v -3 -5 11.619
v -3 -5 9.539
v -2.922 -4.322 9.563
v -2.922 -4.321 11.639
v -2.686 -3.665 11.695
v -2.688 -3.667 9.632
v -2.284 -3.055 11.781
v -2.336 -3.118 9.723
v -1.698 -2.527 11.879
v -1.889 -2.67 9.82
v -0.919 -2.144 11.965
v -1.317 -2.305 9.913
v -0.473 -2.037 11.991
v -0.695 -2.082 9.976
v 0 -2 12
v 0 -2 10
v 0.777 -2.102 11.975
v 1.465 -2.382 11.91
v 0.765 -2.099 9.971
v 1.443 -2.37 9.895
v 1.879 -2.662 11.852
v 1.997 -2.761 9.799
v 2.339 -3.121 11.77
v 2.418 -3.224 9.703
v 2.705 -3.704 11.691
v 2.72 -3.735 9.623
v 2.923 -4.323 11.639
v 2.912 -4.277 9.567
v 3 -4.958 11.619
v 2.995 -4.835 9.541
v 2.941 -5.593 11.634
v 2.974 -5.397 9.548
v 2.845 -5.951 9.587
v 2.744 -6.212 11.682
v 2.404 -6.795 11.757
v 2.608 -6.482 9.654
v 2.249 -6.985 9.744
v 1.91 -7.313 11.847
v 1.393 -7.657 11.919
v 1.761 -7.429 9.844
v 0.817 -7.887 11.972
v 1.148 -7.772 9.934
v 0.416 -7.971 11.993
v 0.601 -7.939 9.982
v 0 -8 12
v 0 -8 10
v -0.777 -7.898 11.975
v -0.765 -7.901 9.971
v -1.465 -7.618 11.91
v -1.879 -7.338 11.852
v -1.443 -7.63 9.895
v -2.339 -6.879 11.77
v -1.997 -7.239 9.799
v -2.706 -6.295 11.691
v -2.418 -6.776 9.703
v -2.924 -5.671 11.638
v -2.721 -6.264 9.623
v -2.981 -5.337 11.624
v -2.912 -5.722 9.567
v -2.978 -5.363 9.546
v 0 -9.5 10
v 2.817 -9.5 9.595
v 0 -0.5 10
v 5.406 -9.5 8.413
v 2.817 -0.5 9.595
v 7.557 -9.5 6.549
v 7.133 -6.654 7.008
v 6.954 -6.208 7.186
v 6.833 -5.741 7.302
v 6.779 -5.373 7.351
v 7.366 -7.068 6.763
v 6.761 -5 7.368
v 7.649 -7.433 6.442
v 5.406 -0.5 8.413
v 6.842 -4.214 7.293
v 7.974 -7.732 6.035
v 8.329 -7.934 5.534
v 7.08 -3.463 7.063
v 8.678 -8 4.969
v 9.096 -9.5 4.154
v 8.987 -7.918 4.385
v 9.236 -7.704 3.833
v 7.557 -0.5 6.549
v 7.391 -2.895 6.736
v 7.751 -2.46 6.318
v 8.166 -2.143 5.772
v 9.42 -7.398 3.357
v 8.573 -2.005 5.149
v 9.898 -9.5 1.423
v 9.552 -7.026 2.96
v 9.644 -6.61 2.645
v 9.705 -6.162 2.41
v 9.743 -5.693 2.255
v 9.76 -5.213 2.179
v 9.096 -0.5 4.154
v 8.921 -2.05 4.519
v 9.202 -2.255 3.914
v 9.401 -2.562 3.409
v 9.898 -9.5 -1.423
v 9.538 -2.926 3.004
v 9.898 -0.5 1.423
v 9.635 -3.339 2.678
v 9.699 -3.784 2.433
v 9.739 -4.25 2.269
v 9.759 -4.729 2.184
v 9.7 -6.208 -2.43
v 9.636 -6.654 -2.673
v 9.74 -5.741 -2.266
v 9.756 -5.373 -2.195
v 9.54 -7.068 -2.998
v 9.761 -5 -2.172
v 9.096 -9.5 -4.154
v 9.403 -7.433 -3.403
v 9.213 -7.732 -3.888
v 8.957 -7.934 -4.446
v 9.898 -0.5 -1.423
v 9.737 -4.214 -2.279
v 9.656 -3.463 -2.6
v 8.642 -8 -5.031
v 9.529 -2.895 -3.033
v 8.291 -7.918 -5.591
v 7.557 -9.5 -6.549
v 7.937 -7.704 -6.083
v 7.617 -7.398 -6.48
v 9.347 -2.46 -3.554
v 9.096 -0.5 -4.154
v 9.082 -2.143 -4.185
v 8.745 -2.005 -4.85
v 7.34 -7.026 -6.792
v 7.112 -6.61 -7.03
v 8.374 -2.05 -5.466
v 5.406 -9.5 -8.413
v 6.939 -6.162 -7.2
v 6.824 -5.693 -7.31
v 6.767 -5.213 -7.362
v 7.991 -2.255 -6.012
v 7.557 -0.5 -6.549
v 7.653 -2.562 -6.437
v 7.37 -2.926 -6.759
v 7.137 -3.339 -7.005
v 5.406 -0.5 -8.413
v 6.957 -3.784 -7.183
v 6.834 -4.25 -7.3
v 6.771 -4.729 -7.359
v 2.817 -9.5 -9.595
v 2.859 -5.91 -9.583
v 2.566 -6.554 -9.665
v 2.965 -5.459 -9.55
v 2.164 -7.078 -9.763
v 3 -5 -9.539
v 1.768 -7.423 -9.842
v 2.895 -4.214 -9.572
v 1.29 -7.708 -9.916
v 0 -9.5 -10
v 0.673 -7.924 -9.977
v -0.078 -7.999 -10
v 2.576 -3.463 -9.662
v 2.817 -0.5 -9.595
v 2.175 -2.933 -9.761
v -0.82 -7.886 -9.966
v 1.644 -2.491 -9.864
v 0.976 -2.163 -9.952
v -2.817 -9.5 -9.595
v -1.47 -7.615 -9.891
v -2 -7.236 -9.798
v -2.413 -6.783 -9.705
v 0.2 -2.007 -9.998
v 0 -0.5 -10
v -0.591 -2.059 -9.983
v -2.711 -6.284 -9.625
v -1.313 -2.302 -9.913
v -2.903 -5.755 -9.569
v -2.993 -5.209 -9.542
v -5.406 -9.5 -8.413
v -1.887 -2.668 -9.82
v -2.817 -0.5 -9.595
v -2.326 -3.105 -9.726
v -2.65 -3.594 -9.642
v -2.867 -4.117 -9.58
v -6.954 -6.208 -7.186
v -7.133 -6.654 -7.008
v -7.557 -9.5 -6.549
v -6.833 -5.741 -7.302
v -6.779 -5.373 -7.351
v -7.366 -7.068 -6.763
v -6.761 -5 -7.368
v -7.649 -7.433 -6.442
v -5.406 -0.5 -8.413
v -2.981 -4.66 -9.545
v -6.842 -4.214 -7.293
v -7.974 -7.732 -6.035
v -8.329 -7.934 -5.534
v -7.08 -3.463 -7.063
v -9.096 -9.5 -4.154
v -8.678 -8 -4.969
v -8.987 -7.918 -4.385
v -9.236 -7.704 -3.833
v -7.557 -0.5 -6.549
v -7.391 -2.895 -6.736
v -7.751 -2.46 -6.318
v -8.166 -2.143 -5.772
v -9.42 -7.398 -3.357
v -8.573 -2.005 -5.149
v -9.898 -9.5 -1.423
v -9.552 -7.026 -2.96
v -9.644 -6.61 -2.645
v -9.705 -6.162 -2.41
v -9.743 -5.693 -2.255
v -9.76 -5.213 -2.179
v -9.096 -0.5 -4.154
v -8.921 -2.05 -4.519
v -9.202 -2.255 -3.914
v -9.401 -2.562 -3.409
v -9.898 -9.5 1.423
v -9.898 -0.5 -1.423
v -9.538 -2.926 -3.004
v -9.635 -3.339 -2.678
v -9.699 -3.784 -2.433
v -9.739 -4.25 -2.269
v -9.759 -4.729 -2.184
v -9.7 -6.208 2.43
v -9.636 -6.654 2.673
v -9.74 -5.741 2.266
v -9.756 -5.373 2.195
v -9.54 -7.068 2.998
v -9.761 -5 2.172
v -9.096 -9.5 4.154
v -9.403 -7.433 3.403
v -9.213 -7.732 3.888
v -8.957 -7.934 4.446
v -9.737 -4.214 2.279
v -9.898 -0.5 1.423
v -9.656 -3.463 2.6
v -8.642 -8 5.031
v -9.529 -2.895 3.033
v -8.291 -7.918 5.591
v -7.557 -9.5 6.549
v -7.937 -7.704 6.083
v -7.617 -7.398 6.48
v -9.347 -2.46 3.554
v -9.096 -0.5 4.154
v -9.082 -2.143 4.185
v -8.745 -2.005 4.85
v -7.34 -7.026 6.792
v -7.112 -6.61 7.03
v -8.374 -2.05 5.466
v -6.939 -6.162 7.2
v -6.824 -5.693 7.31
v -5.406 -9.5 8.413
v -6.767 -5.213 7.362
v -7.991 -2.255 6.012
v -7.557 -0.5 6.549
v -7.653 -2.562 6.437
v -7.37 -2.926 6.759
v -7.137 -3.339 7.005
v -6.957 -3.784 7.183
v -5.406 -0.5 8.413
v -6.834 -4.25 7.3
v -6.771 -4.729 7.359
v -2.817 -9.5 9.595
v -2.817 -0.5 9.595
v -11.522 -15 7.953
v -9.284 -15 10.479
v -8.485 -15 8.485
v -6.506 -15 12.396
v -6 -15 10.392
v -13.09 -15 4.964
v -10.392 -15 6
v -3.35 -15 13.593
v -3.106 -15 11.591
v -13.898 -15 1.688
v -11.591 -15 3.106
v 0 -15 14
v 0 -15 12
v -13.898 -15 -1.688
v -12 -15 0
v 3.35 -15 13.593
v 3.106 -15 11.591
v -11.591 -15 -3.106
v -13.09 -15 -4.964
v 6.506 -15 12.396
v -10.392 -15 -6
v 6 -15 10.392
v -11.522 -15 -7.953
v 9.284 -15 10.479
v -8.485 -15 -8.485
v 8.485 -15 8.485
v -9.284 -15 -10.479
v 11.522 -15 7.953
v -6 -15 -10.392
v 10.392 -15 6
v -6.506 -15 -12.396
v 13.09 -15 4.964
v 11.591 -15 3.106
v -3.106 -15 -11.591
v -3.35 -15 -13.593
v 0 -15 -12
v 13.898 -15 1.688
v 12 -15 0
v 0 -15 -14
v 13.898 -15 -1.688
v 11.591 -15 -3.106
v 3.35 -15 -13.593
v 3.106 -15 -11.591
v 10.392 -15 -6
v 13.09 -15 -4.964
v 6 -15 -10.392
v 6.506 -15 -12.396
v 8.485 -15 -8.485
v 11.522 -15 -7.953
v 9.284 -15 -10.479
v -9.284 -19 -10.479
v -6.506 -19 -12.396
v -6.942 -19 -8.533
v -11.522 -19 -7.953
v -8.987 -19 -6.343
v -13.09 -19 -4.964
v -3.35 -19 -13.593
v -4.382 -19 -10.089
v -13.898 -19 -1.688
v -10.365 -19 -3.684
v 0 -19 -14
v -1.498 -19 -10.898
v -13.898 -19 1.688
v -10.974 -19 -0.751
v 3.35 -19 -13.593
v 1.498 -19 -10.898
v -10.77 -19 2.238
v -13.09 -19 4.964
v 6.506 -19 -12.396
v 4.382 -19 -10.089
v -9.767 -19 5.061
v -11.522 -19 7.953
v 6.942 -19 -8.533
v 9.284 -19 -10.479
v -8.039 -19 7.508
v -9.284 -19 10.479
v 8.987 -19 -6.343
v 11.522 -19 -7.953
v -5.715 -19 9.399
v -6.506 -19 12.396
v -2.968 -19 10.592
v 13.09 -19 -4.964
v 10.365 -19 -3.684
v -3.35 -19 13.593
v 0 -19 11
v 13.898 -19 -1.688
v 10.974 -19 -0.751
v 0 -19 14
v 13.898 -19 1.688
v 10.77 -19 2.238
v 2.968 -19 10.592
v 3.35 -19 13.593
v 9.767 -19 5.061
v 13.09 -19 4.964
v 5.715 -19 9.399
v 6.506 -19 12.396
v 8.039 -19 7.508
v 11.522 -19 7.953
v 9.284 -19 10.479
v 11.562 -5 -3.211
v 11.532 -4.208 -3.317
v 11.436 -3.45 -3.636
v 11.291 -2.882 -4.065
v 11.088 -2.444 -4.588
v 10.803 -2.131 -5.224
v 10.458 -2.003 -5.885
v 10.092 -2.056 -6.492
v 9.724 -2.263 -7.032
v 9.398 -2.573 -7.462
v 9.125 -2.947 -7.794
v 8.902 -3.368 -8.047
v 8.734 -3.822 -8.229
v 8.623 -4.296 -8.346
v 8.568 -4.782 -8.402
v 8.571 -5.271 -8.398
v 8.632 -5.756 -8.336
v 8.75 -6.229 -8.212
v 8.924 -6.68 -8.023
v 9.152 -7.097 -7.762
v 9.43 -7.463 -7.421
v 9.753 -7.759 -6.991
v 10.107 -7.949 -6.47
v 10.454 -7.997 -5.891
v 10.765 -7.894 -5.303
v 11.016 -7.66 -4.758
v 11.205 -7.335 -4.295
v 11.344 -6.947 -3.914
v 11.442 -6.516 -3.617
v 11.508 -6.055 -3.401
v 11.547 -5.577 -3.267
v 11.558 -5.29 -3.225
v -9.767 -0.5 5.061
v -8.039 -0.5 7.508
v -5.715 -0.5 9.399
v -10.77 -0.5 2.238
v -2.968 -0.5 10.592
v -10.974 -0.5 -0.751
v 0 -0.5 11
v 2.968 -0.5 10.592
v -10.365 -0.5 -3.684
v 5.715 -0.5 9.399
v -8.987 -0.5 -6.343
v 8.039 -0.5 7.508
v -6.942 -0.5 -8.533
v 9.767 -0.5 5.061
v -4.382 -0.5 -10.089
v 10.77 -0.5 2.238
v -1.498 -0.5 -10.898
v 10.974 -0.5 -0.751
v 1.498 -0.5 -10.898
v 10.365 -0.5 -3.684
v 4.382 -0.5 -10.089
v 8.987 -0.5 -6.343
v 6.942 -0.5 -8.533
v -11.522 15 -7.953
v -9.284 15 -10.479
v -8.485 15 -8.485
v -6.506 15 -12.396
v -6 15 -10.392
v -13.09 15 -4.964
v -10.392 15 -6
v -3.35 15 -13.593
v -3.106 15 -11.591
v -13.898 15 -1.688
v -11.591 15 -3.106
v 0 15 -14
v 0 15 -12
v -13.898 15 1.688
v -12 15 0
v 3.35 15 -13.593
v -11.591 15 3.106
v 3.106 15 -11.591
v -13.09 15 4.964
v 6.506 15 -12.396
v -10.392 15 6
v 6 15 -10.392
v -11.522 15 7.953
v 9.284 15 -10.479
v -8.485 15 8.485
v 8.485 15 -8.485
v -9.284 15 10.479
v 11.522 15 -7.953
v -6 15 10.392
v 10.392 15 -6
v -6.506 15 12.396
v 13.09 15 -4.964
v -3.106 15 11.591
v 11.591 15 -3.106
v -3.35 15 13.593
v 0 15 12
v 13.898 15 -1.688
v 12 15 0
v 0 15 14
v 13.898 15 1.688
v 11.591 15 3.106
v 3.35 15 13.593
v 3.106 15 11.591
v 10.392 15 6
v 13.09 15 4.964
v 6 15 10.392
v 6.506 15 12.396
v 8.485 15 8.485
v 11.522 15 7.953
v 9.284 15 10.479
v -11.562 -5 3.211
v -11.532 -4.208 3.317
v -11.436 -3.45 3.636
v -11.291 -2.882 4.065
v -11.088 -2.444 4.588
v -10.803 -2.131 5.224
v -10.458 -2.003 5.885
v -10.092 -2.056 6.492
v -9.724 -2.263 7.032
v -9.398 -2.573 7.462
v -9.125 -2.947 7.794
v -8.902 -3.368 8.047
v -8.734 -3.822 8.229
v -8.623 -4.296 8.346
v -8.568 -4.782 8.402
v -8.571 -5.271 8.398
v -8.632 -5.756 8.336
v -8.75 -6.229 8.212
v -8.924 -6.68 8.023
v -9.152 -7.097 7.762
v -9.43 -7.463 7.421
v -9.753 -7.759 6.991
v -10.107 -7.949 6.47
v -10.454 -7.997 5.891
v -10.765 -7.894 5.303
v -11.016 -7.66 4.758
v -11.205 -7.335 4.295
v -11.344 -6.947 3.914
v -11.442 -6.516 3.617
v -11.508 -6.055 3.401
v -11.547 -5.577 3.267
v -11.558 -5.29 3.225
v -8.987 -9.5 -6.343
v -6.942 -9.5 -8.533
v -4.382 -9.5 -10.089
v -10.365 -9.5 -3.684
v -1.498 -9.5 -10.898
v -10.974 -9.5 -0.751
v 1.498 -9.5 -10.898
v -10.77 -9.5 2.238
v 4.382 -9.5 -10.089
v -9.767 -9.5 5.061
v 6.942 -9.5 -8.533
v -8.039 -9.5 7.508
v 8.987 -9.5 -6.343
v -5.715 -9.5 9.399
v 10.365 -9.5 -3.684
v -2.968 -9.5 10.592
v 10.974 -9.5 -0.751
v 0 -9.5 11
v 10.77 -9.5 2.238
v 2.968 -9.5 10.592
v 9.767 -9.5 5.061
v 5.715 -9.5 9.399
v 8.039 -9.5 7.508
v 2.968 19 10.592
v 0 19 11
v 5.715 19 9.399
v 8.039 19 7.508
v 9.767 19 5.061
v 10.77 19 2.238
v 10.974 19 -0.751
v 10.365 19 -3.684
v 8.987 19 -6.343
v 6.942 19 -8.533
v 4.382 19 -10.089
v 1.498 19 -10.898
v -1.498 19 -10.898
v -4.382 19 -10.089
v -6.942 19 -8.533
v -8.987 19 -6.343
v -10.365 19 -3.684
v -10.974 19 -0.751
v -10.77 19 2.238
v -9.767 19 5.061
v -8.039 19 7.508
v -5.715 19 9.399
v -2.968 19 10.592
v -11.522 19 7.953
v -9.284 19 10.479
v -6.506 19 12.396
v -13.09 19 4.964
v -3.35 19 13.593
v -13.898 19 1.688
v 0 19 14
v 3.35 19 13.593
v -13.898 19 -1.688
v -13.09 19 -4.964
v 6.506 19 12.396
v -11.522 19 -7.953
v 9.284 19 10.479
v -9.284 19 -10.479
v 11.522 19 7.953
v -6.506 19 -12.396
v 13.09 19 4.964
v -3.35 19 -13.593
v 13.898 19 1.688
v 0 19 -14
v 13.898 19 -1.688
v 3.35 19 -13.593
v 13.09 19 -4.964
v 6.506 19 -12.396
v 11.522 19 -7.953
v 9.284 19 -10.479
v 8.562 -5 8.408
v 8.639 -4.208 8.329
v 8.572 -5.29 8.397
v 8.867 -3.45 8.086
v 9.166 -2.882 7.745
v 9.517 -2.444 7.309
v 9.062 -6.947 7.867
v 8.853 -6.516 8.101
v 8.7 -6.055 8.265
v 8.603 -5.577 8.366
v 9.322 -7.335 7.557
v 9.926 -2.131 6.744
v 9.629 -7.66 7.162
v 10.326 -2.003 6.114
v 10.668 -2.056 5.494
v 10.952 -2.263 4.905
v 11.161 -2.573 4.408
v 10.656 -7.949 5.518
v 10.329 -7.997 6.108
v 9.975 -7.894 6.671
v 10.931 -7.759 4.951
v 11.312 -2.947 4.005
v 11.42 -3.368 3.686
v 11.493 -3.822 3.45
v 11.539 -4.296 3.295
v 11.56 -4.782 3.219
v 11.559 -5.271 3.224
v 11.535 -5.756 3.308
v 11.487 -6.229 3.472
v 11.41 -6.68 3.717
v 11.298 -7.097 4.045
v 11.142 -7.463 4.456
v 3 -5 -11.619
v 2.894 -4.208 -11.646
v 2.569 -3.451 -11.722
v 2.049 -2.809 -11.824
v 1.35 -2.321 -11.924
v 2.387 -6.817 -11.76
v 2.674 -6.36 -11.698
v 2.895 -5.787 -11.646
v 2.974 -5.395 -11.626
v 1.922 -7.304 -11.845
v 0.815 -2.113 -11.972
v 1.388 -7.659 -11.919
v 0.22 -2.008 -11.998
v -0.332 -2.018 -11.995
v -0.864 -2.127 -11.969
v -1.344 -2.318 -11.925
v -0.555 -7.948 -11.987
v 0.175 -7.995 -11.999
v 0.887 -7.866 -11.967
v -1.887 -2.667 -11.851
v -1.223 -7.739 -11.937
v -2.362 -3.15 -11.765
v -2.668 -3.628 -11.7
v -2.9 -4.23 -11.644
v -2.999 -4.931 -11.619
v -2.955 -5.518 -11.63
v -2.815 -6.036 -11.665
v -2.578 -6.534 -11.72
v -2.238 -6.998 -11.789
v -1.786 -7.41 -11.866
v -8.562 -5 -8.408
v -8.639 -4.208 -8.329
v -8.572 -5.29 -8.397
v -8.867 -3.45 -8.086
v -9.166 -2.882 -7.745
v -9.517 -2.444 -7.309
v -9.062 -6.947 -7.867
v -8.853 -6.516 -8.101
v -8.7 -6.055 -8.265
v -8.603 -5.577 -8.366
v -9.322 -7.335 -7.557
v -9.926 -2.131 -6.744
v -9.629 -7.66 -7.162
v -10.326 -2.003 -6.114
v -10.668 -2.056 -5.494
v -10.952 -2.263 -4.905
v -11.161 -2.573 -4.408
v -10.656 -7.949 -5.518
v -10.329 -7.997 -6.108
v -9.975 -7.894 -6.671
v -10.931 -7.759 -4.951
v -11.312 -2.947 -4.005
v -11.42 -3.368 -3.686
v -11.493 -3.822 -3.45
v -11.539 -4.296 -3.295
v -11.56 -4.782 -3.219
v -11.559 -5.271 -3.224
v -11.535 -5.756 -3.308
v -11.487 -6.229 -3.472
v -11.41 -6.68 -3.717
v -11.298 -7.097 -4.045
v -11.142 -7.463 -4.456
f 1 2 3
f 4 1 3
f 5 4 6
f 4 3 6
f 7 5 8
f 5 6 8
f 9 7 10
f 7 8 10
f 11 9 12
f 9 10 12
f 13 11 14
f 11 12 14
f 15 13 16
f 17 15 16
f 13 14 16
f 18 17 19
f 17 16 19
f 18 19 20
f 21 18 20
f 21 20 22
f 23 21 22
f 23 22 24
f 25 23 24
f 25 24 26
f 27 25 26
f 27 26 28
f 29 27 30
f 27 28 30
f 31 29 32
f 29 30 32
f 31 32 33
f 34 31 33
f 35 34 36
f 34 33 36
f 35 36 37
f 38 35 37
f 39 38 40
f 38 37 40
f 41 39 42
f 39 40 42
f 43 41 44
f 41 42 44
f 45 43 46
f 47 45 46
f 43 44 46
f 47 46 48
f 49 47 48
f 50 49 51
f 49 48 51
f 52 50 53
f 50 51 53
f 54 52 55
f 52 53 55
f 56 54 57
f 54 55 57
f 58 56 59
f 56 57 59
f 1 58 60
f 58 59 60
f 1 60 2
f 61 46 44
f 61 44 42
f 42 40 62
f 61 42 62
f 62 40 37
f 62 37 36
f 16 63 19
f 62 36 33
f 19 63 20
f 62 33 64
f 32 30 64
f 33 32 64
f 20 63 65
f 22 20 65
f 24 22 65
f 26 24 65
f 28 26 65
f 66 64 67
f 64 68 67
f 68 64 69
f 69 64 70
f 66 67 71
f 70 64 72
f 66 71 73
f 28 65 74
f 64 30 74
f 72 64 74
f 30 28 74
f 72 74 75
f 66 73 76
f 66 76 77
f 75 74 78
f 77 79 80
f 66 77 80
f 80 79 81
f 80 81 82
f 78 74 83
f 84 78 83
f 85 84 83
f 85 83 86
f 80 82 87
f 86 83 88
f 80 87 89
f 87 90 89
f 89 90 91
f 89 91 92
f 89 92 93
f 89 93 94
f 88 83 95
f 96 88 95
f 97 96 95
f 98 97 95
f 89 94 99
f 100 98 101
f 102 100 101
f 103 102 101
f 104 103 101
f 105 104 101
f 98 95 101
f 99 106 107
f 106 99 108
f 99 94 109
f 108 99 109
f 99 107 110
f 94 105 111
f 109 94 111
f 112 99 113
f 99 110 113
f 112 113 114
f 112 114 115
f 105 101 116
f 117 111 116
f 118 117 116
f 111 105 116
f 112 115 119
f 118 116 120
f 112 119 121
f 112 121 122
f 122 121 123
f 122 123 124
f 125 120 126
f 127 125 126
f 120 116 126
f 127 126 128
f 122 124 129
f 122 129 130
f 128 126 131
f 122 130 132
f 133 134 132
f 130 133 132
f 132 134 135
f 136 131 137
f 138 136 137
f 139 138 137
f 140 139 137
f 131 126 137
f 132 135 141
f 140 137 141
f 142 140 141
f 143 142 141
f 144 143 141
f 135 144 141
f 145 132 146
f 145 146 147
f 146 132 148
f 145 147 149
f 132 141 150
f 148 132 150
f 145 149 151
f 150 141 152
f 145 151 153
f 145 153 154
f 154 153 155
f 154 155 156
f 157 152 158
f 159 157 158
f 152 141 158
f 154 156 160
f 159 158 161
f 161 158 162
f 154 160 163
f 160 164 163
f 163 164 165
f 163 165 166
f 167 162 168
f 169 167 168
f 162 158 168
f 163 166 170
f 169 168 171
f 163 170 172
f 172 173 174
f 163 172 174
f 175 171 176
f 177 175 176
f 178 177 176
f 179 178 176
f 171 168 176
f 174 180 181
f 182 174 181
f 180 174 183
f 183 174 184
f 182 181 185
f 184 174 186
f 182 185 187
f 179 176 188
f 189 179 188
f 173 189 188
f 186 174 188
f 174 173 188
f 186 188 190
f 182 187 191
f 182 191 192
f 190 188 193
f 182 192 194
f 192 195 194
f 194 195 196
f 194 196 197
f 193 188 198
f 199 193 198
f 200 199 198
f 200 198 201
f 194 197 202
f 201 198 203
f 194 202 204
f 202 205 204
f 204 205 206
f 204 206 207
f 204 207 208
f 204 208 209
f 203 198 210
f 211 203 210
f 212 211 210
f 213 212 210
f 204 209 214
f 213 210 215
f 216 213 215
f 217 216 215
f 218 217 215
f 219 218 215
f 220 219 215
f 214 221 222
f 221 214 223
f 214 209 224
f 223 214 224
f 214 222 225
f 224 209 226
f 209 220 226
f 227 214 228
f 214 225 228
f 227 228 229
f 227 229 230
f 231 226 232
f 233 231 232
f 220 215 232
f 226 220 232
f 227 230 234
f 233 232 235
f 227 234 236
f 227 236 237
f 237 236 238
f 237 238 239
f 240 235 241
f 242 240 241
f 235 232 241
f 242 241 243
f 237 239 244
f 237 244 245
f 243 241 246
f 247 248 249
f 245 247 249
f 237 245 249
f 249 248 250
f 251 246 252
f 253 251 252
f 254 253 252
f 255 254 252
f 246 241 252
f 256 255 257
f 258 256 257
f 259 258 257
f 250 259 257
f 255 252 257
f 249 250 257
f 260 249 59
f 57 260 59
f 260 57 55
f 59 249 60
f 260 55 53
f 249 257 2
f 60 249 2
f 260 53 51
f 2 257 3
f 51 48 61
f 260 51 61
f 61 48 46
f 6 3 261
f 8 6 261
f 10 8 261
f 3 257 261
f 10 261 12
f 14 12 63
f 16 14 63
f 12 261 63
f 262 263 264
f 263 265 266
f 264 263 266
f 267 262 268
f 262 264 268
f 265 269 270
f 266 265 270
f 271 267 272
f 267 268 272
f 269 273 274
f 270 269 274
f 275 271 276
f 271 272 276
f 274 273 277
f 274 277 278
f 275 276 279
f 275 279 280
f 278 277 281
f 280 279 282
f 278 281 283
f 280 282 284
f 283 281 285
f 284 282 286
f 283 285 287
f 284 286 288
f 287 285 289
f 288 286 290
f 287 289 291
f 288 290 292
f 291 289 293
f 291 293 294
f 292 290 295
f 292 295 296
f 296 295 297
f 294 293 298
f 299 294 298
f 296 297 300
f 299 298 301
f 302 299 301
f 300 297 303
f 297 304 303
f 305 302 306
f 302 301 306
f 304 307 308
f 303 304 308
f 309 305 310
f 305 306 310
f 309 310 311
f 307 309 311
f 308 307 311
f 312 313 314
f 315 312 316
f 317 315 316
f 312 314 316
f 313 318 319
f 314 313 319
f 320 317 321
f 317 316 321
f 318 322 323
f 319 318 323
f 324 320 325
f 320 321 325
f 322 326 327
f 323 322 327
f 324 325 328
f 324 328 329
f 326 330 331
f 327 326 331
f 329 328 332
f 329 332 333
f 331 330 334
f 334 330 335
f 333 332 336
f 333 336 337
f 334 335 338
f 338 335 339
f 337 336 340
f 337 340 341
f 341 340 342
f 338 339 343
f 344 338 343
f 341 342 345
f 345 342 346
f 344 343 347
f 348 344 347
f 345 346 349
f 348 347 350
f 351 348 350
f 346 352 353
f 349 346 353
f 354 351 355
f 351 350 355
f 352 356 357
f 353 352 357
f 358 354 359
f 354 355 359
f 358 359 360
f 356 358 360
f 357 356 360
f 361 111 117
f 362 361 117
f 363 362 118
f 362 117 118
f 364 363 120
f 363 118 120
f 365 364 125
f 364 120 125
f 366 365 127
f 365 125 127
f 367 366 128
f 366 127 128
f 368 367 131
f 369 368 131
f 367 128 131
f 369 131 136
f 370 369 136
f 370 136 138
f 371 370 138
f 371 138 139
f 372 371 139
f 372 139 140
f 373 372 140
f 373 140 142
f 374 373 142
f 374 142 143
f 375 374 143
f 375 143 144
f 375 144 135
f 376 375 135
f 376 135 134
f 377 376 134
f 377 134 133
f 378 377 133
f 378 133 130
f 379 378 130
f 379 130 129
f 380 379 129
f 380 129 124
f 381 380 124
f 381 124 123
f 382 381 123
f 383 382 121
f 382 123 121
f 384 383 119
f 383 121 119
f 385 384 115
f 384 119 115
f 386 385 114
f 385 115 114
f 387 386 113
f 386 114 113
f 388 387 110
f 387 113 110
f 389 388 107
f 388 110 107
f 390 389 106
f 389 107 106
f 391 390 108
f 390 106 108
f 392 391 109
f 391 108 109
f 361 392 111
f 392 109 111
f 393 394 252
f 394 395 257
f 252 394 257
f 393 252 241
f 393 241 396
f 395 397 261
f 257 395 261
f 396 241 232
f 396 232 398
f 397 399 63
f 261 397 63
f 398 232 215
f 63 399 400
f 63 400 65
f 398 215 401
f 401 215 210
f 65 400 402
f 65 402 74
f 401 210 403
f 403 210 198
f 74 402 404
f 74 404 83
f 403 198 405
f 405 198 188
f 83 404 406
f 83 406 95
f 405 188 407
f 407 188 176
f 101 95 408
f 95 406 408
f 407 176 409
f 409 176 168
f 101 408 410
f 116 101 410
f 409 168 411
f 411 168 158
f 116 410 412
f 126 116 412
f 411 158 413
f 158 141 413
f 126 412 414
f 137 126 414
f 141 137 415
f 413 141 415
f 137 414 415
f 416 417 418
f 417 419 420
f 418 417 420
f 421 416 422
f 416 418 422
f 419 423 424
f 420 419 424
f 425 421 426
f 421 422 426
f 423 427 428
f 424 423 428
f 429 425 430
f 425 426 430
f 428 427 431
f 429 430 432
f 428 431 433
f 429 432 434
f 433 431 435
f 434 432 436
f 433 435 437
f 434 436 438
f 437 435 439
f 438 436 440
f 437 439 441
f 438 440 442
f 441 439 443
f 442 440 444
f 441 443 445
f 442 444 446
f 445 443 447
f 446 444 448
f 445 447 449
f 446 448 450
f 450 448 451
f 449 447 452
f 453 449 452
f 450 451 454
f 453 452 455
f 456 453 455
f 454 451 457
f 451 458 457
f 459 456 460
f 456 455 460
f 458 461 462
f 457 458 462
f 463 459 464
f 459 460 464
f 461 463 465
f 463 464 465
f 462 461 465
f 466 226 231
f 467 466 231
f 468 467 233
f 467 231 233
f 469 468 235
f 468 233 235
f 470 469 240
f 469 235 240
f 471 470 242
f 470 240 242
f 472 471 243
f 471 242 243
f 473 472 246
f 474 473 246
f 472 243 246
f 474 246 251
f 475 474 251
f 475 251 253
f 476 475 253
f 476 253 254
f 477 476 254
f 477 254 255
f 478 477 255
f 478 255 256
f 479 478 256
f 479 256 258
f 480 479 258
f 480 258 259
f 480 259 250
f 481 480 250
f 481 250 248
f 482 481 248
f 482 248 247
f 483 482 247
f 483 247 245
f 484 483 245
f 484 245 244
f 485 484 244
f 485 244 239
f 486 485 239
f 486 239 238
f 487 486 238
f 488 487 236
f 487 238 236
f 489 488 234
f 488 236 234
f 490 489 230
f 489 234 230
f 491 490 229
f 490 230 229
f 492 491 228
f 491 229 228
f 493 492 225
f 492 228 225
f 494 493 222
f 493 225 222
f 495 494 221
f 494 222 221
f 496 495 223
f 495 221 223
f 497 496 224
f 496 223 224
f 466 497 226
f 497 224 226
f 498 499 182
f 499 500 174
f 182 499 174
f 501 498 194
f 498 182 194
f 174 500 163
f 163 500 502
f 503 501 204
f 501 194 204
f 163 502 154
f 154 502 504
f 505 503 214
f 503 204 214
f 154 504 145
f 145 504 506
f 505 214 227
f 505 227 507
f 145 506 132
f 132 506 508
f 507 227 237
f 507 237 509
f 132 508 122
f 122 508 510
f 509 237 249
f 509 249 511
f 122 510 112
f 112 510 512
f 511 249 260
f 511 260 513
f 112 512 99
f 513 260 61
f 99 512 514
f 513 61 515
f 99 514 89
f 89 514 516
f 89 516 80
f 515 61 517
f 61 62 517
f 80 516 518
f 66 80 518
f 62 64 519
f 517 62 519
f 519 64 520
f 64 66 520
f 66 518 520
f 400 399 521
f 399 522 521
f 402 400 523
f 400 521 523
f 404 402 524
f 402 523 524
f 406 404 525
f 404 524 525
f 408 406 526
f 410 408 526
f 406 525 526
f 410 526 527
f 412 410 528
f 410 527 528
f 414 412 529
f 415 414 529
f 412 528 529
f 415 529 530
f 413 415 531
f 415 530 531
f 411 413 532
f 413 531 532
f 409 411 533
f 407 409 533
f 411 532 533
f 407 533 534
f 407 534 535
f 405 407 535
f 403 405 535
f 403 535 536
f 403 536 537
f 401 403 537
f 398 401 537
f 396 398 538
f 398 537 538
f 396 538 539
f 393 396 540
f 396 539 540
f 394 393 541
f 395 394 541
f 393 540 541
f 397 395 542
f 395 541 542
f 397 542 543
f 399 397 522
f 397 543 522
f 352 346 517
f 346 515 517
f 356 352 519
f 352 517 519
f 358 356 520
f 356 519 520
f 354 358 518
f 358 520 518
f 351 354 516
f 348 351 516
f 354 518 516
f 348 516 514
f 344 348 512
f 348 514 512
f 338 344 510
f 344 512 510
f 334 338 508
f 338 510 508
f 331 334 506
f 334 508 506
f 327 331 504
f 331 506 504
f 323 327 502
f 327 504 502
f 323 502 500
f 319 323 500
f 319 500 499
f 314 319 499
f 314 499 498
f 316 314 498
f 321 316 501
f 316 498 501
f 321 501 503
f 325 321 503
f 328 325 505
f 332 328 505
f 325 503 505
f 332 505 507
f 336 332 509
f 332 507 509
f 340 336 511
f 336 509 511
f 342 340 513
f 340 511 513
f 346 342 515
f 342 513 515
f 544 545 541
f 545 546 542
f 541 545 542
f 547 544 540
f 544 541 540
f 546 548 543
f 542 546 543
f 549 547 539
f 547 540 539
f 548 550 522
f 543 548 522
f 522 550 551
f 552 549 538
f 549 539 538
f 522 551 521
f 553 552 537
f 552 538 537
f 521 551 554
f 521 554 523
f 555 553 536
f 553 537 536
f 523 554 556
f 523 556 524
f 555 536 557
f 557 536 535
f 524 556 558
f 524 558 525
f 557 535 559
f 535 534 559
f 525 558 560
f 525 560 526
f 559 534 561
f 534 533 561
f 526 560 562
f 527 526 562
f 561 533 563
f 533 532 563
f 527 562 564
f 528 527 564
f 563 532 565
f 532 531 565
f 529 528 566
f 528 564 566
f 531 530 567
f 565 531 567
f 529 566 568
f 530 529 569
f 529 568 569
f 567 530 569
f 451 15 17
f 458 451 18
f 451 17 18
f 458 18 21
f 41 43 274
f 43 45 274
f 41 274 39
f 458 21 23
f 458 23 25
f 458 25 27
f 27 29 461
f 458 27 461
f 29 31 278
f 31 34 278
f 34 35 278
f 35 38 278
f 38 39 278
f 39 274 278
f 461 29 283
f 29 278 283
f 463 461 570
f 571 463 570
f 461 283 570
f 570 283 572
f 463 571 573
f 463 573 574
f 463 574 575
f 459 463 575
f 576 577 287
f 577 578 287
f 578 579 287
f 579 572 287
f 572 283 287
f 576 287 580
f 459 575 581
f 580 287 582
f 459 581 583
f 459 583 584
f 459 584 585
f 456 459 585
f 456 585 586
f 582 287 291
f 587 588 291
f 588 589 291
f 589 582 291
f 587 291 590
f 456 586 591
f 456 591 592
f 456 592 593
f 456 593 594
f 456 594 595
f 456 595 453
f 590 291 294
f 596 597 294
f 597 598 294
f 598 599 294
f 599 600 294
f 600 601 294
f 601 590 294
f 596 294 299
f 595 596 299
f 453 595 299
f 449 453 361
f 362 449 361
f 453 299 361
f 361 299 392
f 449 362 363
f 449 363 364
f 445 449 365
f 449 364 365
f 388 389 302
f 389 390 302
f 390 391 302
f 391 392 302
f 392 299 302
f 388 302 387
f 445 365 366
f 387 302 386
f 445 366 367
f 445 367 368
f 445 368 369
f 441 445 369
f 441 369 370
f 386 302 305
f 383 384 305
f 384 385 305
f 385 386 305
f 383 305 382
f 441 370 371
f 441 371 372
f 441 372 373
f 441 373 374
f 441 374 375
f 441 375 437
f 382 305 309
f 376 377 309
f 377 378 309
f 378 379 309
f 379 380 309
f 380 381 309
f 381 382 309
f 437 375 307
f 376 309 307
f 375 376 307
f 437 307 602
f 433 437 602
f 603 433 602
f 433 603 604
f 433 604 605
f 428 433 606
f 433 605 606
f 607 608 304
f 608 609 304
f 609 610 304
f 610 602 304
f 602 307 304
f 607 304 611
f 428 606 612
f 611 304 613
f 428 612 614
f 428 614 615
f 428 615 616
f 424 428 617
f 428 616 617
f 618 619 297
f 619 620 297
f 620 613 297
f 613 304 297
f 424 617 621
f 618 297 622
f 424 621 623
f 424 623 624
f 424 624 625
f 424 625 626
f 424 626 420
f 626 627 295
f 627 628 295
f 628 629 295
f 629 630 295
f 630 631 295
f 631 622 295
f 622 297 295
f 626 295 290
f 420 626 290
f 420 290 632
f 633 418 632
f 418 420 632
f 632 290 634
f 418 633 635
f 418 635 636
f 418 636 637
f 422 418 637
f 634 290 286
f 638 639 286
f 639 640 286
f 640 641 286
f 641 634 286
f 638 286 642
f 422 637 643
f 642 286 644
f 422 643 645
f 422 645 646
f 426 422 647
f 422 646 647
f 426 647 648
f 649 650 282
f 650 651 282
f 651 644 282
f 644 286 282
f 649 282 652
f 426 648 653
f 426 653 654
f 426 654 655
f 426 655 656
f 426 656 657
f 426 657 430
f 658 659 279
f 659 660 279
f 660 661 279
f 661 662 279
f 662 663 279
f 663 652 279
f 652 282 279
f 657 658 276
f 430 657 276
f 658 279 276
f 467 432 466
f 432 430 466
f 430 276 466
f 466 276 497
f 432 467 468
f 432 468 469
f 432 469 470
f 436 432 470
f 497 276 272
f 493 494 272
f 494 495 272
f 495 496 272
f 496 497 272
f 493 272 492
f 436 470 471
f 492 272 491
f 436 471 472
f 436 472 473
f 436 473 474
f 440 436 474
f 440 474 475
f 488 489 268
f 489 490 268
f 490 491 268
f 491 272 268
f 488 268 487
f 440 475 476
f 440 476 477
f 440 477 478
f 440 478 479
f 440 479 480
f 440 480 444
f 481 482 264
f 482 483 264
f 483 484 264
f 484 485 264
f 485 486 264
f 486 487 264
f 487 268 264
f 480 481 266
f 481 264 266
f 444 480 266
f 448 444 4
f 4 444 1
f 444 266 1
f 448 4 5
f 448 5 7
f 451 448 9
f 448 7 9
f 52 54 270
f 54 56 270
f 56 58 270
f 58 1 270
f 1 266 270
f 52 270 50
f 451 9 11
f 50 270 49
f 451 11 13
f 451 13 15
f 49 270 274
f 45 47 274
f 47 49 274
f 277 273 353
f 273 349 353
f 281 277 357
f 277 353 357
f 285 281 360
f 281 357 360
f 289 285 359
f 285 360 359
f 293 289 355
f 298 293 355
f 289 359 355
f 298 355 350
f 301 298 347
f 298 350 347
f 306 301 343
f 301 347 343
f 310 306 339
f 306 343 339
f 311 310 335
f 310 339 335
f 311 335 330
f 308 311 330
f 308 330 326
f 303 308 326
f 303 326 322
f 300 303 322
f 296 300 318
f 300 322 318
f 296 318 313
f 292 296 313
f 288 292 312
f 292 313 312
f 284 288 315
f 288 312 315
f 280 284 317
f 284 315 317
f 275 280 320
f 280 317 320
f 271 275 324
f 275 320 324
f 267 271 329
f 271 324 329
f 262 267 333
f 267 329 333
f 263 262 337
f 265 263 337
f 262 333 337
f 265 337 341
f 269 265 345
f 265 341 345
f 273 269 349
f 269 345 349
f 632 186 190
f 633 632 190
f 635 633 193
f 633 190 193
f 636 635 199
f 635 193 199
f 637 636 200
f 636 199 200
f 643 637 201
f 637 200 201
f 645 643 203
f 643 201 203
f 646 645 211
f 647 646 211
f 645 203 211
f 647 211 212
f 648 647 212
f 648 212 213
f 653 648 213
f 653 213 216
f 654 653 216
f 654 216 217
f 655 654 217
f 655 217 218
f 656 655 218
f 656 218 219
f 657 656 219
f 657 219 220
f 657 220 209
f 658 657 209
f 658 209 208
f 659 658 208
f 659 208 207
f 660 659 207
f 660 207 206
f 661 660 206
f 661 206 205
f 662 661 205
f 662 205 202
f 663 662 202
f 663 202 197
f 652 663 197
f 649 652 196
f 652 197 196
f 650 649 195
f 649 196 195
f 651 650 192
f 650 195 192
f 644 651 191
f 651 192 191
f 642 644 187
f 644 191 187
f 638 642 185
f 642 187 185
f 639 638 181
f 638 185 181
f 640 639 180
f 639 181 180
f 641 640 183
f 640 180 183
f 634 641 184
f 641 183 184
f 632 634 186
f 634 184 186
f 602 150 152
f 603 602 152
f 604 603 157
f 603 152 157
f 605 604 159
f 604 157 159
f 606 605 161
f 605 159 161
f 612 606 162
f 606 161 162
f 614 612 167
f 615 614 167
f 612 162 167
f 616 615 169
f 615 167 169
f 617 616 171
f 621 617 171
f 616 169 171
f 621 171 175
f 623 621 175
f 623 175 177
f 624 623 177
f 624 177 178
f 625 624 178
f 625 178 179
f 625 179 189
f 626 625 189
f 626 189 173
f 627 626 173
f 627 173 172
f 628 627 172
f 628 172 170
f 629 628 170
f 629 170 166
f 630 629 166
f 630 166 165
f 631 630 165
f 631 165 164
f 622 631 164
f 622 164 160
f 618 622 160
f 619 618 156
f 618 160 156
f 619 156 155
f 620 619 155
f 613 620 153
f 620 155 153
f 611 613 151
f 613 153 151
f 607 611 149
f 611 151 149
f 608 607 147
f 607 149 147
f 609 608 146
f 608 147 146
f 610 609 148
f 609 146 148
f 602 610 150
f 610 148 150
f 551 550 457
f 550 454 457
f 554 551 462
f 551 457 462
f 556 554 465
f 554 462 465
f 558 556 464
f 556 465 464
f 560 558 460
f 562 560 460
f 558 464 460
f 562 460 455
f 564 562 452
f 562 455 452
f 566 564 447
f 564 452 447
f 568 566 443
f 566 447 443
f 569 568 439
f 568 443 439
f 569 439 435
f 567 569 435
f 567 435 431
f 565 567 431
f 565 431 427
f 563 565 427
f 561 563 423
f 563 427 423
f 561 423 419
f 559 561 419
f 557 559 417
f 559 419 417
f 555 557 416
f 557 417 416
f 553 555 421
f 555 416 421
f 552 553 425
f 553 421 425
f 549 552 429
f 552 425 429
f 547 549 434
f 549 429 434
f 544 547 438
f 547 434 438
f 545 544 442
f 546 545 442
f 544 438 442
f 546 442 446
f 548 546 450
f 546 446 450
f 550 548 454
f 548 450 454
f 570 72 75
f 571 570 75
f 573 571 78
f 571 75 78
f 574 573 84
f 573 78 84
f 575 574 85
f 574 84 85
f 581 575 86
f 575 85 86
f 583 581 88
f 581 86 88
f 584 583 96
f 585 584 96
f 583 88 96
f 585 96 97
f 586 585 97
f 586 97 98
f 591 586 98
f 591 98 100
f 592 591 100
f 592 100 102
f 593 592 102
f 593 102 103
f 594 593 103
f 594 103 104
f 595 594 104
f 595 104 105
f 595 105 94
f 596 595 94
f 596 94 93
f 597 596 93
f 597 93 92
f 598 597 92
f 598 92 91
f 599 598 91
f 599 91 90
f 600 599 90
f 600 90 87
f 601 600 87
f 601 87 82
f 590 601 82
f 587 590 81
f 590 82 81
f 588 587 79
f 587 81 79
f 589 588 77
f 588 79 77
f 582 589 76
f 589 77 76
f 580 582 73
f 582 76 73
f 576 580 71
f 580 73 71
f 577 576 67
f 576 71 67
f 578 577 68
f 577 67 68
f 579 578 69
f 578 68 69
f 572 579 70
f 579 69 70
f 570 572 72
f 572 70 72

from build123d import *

# Parameters (mm, degrees)
F2_R     = 3
F3_DEPTH = 25.4
F4_COUNT = 6


with BuildPart() as f1:
    # F0 (on Right) → F1 (revolve)
    with BuildSketch(Plane.YZ):
        Polygon((-15, 14), (-19, 14), (-19, 11), (-9.5, 11), (-9.5, 10), (-0.5, 10), (-0.5, 11), (19, 11), (19, 14), (15, 14), (15, 12), (-15, 12), align=None)
    revolve(axis=Axis((0, 0, 0), (0, 1, 0)))

    # F2 (on Top) → F3 (cut)
    with BuildSketch(Plane.XY):
        with Locations((0, -5)):
            Circle(F2_R)
    f3 = extrude(amount=-F3_DEPTH, mode=Mode.SUBTRACT)

    # F4: F3 ×6 about axis
    f4_axis = Axis((0, -19, 0), (0, 1, 0))
    for i in range(1, F4_COUNT):
        add(f3.rotate(f4_axis, i * 360 / F4_COUNT), mode=Mode.SUBTRACT)


solid = f1.part
